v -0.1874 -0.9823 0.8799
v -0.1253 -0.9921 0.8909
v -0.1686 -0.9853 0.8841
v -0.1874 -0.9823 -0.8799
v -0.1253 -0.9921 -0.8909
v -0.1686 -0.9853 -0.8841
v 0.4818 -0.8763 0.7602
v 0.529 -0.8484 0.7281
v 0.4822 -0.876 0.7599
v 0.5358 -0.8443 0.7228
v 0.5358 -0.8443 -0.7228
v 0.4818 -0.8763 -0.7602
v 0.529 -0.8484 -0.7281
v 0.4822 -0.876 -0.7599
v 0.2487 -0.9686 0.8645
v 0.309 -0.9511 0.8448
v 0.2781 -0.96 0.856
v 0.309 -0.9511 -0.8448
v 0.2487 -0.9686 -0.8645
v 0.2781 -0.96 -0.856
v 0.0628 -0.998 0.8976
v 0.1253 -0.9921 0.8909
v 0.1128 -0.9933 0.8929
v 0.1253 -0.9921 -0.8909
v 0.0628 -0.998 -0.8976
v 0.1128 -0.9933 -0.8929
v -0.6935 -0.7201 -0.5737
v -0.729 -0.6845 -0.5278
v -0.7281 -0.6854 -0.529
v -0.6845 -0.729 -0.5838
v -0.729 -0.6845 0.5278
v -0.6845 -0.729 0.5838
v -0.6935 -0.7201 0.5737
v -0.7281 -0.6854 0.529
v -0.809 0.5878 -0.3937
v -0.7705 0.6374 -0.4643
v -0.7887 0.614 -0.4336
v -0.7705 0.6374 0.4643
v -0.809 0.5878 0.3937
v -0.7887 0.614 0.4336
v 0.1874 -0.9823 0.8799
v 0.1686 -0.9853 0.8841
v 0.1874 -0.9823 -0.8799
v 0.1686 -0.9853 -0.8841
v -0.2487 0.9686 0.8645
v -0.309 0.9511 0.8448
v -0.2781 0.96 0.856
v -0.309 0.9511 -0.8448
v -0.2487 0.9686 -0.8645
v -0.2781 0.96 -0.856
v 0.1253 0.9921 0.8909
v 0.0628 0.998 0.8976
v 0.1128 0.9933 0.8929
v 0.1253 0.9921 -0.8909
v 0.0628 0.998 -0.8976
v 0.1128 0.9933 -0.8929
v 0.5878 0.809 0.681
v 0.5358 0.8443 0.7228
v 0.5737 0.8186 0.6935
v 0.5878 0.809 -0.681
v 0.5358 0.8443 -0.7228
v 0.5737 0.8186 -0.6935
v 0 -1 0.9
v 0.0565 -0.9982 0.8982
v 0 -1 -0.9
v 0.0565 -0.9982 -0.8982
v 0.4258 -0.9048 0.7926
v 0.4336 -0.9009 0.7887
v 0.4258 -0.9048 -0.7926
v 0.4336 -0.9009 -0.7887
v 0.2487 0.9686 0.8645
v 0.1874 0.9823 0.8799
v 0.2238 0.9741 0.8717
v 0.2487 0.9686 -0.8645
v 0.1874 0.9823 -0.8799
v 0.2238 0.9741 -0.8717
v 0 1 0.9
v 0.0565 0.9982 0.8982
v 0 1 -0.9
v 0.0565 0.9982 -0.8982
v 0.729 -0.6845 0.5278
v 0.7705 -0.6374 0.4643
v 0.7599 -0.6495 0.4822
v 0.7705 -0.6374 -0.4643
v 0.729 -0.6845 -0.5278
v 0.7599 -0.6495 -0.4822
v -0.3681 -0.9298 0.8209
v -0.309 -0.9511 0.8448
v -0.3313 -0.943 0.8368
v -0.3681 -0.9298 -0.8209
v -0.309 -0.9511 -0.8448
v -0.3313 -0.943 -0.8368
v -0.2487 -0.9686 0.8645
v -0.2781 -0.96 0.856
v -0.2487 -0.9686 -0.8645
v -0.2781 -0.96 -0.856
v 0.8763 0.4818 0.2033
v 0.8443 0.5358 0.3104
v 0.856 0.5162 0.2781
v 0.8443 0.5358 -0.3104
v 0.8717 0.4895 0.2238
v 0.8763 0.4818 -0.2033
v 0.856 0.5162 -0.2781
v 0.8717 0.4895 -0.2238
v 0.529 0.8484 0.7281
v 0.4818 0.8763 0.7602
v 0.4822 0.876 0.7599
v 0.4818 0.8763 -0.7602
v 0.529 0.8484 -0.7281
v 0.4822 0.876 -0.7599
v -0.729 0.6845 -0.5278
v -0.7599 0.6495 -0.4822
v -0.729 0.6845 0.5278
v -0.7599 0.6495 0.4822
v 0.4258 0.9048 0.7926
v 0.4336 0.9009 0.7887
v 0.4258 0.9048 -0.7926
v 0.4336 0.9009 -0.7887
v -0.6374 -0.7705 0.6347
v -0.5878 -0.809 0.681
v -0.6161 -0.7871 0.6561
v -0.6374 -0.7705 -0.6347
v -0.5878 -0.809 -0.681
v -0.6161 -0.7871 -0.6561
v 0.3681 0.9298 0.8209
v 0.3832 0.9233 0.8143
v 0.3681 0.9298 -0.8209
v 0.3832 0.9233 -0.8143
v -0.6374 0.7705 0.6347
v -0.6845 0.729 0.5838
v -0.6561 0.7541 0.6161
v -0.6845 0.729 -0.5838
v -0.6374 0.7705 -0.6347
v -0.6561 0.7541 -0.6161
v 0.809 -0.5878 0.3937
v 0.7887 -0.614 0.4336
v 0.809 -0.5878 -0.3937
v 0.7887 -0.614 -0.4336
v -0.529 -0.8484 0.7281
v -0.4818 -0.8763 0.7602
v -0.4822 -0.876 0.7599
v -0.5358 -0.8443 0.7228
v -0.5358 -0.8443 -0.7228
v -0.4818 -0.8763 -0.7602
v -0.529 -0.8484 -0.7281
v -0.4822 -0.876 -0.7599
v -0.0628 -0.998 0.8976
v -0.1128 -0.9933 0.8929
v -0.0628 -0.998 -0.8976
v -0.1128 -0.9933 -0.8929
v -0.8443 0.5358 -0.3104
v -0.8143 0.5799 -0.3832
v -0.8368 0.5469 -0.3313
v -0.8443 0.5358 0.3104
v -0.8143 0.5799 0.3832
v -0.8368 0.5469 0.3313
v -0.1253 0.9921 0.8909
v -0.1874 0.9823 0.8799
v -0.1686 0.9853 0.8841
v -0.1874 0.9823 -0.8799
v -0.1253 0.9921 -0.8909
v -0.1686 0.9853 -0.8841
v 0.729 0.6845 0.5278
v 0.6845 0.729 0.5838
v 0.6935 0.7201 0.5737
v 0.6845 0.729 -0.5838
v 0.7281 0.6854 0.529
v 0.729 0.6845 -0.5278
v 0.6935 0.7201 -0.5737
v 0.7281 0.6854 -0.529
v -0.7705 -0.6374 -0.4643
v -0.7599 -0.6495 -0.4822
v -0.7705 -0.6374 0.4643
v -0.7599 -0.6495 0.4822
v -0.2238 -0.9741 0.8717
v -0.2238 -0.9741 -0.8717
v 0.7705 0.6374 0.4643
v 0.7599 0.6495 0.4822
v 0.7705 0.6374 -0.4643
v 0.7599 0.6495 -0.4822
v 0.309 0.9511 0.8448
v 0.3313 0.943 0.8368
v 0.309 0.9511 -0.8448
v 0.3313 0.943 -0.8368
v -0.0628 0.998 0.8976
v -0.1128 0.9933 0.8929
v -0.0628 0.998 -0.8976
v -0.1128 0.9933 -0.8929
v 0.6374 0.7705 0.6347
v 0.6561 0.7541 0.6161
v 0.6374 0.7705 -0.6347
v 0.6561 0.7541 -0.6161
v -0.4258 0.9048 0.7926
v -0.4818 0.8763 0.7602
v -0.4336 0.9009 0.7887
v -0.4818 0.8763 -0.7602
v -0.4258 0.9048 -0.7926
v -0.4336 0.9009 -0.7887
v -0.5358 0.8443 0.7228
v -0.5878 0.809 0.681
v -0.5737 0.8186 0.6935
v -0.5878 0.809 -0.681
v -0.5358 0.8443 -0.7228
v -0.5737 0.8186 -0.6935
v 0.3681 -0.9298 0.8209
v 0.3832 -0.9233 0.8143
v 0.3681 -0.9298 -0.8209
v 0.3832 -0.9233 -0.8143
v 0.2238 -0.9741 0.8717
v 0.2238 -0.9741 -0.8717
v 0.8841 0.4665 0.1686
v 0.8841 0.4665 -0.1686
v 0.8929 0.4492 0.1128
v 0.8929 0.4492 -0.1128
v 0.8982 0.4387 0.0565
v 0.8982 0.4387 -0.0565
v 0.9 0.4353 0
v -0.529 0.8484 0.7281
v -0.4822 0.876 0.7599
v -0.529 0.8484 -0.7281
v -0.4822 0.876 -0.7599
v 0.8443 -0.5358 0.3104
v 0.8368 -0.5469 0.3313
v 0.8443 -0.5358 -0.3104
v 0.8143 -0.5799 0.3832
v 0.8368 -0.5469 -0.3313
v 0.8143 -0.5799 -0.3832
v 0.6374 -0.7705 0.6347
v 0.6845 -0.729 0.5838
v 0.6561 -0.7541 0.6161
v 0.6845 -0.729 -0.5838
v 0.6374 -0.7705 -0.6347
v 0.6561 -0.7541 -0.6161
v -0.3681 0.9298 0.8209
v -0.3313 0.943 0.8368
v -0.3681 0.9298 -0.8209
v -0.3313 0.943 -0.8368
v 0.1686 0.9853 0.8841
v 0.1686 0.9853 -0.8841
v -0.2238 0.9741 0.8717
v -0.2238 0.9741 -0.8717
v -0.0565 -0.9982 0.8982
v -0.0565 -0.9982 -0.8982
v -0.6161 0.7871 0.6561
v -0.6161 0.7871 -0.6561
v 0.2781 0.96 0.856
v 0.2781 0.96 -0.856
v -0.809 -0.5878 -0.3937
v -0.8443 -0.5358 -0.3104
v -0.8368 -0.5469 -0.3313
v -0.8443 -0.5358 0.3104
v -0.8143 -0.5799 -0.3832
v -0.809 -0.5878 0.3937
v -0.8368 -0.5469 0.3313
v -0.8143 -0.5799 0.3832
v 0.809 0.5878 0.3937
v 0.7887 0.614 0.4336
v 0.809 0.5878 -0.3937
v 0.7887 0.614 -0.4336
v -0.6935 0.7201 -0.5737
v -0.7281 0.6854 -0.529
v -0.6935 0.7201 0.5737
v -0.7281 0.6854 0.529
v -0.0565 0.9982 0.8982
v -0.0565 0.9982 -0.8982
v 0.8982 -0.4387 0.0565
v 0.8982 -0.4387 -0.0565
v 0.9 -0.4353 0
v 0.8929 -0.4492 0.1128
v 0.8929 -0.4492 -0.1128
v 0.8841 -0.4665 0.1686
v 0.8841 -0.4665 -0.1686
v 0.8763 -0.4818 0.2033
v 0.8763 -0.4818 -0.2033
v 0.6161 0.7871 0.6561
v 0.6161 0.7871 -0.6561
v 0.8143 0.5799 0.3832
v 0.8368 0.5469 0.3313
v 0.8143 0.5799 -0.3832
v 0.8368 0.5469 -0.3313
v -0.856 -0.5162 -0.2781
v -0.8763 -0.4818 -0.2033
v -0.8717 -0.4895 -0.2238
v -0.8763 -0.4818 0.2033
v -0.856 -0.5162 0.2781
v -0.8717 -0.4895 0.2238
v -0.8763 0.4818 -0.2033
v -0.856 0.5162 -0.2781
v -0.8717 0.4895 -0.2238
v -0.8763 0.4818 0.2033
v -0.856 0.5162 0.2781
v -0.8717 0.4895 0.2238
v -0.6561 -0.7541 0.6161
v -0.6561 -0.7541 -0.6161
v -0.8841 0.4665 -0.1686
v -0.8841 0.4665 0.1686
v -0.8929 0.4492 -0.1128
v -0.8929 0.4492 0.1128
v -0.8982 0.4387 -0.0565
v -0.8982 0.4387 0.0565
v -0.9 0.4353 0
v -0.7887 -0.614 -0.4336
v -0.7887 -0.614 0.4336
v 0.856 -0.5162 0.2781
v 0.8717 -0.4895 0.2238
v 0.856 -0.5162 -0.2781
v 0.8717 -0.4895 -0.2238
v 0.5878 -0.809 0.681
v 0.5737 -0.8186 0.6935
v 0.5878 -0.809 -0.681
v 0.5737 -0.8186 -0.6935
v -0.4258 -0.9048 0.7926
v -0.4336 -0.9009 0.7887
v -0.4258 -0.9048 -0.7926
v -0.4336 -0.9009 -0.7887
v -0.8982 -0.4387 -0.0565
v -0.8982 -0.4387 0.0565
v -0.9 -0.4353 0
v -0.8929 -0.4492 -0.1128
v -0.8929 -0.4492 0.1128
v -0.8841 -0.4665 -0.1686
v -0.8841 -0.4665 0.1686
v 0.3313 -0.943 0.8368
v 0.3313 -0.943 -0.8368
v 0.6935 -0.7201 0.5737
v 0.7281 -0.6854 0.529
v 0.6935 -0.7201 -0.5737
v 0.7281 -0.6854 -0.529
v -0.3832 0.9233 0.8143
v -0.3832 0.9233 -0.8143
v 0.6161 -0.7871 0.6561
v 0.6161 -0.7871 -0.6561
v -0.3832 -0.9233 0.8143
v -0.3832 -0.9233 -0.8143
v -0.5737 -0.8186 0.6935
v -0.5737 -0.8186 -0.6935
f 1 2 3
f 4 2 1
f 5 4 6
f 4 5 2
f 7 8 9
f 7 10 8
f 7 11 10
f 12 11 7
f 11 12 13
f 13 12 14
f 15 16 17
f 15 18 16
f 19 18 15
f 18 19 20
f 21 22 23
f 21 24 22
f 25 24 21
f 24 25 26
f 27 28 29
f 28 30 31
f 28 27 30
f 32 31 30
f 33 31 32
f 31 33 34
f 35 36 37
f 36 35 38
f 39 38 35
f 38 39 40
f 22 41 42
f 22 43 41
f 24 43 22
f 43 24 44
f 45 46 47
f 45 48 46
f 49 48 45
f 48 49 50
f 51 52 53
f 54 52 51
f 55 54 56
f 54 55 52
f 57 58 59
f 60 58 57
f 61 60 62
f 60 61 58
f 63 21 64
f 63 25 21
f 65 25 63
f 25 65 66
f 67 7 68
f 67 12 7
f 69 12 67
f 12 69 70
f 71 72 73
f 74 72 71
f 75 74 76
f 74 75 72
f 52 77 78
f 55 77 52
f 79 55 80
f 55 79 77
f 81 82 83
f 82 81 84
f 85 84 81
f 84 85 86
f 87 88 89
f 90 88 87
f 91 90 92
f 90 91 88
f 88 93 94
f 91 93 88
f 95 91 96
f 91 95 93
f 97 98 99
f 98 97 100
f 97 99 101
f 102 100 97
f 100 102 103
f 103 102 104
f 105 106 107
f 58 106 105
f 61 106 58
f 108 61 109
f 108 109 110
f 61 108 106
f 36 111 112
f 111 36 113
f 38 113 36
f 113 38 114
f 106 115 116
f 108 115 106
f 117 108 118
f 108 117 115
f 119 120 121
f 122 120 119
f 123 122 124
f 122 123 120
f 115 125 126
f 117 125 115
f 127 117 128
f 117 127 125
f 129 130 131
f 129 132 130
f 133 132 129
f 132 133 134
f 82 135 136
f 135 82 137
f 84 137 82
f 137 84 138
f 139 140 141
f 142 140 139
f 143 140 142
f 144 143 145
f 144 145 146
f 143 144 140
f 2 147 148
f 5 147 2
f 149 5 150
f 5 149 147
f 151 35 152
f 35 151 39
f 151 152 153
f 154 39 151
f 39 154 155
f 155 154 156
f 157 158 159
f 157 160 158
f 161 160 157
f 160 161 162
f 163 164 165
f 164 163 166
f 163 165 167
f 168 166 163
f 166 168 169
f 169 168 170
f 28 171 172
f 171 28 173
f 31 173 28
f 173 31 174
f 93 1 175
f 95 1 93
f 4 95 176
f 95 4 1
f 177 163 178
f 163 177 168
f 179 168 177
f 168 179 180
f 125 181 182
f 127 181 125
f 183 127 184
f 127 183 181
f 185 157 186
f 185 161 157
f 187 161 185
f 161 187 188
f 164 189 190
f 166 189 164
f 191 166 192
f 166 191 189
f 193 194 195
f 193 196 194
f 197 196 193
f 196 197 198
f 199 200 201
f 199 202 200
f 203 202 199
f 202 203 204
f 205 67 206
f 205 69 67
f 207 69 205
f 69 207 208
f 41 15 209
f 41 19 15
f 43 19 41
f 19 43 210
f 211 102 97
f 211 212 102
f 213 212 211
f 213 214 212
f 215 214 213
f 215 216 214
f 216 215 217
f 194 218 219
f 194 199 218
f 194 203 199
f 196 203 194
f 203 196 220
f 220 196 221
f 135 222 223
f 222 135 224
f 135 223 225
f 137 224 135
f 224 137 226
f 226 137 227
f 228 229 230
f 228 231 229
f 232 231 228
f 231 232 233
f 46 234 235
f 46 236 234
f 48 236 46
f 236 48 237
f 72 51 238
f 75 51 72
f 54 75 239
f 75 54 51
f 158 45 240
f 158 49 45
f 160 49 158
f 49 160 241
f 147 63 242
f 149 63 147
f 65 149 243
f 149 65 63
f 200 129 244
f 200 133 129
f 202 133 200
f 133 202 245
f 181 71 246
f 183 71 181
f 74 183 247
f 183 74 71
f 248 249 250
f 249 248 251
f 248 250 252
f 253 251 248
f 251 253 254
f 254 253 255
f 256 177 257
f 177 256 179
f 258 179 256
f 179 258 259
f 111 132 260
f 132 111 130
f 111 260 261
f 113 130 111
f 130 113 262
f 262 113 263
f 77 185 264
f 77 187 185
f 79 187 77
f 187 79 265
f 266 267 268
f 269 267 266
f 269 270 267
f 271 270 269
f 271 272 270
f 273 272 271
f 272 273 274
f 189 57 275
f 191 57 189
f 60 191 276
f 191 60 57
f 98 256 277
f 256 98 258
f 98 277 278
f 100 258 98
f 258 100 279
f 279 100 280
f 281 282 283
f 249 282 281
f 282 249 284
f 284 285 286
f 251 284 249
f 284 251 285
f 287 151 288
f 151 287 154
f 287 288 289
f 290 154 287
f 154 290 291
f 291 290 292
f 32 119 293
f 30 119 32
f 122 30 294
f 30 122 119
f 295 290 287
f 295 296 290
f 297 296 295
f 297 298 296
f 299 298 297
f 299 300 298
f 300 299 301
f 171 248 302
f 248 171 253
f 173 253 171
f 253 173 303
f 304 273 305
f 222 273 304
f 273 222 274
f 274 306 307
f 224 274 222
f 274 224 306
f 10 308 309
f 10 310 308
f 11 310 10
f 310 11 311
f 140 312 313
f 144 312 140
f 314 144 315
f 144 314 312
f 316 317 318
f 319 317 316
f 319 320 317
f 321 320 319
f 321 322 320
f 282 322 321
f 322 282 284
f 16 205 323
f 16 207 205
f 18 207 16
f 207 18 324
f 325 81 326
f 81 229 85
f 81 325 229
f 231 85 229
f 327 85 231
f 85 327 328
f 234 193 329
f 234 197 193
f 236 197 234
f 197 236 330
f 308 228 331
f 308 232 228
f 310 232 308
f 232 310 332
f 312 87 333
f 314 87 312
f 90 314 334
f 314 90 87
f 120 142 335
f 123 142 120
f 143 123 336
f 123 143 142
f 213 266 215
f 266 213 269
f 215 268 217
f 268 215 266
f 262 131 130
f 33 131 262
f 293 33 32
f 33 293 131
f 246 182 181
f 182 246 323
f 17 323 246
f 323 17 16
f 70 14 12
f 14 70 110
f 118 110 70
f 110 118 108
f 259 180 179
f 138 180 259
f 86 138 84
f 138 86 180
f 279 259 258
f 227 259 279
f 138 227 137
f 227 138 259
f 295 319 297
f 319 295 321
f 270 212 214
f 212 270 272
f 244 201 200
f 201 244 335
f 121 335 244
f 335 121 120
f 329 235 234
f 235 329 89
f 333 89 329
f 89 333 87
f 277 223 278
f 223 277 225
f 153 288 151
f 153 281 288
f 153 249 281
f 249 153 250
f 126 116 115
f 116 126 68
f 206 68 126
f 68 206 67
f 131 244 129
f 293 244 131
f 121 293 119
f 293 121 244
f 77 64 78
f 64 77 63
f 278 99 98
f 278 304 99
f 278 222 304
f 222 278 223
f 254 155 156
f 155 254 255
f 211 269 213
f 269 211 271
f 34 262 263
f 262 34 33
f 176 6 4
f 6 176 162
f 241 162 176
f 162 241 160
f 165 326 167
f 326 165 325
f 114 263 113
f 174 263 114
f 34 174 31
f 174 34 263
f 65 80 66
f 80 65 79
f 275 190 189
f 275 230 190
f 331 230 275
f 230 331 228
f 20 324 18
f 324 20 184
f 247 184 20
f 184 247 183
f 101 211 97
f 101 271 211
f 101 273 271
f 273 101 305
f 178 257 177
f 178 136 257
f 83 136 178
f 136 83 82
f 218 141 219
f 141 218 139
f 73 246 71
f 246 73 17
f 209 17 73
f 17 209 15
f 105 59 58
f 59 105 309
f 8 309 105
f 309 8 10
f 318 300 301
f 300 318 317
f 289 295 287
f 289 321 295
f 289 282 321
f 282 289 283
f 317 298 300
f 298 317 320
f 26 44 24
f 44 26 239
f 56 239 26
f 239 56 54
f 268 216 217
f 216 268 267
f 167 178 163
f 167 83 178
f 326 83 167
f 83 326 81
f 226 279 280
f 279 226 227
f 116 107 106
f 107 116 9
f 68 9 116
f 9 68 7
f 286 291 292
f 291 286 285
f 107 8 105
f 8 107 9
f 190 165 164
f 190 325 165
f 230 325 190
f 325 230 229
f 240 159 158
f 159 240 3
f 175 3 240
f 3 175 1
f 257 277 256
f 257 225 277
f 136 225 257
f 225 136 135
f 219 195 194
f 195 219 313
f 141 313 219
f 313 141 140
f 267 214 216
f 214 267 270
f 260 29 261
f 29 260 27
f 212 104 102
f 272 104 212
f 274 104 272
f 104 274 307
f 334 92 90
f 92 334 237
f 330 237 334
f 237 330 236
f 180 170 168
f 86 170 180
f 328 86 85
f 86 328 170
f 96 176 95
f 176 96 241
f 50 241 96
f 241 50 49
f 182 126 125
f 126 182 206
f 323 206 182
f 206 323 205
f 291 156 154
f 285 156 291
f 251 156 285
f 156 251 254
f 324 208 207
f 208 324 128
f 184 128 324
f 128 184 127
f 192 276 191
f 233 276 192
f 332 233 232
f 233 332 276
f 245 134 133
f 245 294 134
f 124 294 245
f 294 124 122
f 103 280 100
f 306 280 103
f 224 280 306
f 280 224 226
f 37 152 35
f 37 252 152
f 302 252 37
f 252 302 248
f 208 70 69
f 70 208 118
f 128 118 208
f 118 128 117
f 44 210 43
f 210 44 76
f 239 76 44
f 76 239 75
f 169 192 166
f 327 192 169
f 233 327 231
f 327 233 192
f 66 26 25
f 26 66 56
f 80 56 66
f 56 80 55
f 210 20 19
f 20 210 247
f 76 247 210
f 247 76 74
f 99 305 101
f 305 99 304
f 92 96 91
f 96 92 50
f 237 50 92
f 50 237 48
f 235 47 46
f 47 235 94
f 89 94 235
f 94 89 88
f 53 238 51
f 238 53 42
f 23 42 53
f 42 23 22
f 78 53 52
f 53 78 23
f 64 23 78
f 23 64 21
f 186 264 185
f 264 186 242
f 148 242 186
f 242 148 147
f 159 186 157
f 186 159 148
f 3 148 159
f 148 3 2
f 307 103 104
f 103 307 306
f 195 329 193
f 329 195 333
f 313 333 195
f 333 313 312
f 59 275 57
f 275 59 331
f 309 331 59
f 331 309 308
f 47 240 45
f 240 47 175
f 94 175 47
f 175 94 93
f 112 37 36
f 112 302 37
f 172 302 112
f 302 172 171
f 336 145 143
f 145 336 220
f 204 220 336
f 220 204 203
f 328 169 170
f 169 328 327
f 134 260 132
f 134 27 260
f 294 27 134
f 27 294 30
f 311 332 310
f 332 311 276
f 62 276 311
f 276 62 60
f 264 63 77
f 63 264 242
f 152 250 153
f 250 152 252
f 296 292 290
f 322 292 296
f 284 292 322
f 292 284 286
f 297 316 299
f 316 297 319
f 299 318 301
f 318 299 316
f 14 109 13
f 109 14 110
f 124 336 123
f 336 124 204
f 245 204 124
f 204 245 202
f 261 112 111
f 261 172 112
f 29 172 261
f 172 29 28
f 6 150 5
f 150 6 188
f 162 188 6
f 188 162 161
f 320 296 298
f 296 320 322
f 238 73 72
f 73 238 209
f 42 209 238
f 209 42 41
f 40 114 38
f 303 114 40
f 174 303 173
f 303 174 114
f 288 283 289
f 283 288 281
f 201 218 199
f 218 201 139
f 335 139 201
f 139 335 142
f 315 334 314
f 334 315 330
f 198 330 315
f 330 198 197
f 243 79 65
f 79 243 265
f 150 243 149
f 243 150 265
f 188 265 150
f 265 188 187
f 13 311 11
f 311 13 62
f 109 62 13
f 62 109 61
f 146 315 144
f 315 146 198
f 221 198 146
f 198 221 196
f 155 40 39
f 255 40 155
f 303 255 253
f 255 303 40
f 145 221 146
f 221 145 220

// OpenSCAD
// Unit of length: Unit.MM
intersection()
{
   cylinder(h = 4.0, r = 1.0, center = true, $fn = 100);
   rotate(a = [90.0, 0.0, 0.0])
   {
      cylinder(h = 4.0, r = 0.9, center = true, $fn = 100);
   }
}
